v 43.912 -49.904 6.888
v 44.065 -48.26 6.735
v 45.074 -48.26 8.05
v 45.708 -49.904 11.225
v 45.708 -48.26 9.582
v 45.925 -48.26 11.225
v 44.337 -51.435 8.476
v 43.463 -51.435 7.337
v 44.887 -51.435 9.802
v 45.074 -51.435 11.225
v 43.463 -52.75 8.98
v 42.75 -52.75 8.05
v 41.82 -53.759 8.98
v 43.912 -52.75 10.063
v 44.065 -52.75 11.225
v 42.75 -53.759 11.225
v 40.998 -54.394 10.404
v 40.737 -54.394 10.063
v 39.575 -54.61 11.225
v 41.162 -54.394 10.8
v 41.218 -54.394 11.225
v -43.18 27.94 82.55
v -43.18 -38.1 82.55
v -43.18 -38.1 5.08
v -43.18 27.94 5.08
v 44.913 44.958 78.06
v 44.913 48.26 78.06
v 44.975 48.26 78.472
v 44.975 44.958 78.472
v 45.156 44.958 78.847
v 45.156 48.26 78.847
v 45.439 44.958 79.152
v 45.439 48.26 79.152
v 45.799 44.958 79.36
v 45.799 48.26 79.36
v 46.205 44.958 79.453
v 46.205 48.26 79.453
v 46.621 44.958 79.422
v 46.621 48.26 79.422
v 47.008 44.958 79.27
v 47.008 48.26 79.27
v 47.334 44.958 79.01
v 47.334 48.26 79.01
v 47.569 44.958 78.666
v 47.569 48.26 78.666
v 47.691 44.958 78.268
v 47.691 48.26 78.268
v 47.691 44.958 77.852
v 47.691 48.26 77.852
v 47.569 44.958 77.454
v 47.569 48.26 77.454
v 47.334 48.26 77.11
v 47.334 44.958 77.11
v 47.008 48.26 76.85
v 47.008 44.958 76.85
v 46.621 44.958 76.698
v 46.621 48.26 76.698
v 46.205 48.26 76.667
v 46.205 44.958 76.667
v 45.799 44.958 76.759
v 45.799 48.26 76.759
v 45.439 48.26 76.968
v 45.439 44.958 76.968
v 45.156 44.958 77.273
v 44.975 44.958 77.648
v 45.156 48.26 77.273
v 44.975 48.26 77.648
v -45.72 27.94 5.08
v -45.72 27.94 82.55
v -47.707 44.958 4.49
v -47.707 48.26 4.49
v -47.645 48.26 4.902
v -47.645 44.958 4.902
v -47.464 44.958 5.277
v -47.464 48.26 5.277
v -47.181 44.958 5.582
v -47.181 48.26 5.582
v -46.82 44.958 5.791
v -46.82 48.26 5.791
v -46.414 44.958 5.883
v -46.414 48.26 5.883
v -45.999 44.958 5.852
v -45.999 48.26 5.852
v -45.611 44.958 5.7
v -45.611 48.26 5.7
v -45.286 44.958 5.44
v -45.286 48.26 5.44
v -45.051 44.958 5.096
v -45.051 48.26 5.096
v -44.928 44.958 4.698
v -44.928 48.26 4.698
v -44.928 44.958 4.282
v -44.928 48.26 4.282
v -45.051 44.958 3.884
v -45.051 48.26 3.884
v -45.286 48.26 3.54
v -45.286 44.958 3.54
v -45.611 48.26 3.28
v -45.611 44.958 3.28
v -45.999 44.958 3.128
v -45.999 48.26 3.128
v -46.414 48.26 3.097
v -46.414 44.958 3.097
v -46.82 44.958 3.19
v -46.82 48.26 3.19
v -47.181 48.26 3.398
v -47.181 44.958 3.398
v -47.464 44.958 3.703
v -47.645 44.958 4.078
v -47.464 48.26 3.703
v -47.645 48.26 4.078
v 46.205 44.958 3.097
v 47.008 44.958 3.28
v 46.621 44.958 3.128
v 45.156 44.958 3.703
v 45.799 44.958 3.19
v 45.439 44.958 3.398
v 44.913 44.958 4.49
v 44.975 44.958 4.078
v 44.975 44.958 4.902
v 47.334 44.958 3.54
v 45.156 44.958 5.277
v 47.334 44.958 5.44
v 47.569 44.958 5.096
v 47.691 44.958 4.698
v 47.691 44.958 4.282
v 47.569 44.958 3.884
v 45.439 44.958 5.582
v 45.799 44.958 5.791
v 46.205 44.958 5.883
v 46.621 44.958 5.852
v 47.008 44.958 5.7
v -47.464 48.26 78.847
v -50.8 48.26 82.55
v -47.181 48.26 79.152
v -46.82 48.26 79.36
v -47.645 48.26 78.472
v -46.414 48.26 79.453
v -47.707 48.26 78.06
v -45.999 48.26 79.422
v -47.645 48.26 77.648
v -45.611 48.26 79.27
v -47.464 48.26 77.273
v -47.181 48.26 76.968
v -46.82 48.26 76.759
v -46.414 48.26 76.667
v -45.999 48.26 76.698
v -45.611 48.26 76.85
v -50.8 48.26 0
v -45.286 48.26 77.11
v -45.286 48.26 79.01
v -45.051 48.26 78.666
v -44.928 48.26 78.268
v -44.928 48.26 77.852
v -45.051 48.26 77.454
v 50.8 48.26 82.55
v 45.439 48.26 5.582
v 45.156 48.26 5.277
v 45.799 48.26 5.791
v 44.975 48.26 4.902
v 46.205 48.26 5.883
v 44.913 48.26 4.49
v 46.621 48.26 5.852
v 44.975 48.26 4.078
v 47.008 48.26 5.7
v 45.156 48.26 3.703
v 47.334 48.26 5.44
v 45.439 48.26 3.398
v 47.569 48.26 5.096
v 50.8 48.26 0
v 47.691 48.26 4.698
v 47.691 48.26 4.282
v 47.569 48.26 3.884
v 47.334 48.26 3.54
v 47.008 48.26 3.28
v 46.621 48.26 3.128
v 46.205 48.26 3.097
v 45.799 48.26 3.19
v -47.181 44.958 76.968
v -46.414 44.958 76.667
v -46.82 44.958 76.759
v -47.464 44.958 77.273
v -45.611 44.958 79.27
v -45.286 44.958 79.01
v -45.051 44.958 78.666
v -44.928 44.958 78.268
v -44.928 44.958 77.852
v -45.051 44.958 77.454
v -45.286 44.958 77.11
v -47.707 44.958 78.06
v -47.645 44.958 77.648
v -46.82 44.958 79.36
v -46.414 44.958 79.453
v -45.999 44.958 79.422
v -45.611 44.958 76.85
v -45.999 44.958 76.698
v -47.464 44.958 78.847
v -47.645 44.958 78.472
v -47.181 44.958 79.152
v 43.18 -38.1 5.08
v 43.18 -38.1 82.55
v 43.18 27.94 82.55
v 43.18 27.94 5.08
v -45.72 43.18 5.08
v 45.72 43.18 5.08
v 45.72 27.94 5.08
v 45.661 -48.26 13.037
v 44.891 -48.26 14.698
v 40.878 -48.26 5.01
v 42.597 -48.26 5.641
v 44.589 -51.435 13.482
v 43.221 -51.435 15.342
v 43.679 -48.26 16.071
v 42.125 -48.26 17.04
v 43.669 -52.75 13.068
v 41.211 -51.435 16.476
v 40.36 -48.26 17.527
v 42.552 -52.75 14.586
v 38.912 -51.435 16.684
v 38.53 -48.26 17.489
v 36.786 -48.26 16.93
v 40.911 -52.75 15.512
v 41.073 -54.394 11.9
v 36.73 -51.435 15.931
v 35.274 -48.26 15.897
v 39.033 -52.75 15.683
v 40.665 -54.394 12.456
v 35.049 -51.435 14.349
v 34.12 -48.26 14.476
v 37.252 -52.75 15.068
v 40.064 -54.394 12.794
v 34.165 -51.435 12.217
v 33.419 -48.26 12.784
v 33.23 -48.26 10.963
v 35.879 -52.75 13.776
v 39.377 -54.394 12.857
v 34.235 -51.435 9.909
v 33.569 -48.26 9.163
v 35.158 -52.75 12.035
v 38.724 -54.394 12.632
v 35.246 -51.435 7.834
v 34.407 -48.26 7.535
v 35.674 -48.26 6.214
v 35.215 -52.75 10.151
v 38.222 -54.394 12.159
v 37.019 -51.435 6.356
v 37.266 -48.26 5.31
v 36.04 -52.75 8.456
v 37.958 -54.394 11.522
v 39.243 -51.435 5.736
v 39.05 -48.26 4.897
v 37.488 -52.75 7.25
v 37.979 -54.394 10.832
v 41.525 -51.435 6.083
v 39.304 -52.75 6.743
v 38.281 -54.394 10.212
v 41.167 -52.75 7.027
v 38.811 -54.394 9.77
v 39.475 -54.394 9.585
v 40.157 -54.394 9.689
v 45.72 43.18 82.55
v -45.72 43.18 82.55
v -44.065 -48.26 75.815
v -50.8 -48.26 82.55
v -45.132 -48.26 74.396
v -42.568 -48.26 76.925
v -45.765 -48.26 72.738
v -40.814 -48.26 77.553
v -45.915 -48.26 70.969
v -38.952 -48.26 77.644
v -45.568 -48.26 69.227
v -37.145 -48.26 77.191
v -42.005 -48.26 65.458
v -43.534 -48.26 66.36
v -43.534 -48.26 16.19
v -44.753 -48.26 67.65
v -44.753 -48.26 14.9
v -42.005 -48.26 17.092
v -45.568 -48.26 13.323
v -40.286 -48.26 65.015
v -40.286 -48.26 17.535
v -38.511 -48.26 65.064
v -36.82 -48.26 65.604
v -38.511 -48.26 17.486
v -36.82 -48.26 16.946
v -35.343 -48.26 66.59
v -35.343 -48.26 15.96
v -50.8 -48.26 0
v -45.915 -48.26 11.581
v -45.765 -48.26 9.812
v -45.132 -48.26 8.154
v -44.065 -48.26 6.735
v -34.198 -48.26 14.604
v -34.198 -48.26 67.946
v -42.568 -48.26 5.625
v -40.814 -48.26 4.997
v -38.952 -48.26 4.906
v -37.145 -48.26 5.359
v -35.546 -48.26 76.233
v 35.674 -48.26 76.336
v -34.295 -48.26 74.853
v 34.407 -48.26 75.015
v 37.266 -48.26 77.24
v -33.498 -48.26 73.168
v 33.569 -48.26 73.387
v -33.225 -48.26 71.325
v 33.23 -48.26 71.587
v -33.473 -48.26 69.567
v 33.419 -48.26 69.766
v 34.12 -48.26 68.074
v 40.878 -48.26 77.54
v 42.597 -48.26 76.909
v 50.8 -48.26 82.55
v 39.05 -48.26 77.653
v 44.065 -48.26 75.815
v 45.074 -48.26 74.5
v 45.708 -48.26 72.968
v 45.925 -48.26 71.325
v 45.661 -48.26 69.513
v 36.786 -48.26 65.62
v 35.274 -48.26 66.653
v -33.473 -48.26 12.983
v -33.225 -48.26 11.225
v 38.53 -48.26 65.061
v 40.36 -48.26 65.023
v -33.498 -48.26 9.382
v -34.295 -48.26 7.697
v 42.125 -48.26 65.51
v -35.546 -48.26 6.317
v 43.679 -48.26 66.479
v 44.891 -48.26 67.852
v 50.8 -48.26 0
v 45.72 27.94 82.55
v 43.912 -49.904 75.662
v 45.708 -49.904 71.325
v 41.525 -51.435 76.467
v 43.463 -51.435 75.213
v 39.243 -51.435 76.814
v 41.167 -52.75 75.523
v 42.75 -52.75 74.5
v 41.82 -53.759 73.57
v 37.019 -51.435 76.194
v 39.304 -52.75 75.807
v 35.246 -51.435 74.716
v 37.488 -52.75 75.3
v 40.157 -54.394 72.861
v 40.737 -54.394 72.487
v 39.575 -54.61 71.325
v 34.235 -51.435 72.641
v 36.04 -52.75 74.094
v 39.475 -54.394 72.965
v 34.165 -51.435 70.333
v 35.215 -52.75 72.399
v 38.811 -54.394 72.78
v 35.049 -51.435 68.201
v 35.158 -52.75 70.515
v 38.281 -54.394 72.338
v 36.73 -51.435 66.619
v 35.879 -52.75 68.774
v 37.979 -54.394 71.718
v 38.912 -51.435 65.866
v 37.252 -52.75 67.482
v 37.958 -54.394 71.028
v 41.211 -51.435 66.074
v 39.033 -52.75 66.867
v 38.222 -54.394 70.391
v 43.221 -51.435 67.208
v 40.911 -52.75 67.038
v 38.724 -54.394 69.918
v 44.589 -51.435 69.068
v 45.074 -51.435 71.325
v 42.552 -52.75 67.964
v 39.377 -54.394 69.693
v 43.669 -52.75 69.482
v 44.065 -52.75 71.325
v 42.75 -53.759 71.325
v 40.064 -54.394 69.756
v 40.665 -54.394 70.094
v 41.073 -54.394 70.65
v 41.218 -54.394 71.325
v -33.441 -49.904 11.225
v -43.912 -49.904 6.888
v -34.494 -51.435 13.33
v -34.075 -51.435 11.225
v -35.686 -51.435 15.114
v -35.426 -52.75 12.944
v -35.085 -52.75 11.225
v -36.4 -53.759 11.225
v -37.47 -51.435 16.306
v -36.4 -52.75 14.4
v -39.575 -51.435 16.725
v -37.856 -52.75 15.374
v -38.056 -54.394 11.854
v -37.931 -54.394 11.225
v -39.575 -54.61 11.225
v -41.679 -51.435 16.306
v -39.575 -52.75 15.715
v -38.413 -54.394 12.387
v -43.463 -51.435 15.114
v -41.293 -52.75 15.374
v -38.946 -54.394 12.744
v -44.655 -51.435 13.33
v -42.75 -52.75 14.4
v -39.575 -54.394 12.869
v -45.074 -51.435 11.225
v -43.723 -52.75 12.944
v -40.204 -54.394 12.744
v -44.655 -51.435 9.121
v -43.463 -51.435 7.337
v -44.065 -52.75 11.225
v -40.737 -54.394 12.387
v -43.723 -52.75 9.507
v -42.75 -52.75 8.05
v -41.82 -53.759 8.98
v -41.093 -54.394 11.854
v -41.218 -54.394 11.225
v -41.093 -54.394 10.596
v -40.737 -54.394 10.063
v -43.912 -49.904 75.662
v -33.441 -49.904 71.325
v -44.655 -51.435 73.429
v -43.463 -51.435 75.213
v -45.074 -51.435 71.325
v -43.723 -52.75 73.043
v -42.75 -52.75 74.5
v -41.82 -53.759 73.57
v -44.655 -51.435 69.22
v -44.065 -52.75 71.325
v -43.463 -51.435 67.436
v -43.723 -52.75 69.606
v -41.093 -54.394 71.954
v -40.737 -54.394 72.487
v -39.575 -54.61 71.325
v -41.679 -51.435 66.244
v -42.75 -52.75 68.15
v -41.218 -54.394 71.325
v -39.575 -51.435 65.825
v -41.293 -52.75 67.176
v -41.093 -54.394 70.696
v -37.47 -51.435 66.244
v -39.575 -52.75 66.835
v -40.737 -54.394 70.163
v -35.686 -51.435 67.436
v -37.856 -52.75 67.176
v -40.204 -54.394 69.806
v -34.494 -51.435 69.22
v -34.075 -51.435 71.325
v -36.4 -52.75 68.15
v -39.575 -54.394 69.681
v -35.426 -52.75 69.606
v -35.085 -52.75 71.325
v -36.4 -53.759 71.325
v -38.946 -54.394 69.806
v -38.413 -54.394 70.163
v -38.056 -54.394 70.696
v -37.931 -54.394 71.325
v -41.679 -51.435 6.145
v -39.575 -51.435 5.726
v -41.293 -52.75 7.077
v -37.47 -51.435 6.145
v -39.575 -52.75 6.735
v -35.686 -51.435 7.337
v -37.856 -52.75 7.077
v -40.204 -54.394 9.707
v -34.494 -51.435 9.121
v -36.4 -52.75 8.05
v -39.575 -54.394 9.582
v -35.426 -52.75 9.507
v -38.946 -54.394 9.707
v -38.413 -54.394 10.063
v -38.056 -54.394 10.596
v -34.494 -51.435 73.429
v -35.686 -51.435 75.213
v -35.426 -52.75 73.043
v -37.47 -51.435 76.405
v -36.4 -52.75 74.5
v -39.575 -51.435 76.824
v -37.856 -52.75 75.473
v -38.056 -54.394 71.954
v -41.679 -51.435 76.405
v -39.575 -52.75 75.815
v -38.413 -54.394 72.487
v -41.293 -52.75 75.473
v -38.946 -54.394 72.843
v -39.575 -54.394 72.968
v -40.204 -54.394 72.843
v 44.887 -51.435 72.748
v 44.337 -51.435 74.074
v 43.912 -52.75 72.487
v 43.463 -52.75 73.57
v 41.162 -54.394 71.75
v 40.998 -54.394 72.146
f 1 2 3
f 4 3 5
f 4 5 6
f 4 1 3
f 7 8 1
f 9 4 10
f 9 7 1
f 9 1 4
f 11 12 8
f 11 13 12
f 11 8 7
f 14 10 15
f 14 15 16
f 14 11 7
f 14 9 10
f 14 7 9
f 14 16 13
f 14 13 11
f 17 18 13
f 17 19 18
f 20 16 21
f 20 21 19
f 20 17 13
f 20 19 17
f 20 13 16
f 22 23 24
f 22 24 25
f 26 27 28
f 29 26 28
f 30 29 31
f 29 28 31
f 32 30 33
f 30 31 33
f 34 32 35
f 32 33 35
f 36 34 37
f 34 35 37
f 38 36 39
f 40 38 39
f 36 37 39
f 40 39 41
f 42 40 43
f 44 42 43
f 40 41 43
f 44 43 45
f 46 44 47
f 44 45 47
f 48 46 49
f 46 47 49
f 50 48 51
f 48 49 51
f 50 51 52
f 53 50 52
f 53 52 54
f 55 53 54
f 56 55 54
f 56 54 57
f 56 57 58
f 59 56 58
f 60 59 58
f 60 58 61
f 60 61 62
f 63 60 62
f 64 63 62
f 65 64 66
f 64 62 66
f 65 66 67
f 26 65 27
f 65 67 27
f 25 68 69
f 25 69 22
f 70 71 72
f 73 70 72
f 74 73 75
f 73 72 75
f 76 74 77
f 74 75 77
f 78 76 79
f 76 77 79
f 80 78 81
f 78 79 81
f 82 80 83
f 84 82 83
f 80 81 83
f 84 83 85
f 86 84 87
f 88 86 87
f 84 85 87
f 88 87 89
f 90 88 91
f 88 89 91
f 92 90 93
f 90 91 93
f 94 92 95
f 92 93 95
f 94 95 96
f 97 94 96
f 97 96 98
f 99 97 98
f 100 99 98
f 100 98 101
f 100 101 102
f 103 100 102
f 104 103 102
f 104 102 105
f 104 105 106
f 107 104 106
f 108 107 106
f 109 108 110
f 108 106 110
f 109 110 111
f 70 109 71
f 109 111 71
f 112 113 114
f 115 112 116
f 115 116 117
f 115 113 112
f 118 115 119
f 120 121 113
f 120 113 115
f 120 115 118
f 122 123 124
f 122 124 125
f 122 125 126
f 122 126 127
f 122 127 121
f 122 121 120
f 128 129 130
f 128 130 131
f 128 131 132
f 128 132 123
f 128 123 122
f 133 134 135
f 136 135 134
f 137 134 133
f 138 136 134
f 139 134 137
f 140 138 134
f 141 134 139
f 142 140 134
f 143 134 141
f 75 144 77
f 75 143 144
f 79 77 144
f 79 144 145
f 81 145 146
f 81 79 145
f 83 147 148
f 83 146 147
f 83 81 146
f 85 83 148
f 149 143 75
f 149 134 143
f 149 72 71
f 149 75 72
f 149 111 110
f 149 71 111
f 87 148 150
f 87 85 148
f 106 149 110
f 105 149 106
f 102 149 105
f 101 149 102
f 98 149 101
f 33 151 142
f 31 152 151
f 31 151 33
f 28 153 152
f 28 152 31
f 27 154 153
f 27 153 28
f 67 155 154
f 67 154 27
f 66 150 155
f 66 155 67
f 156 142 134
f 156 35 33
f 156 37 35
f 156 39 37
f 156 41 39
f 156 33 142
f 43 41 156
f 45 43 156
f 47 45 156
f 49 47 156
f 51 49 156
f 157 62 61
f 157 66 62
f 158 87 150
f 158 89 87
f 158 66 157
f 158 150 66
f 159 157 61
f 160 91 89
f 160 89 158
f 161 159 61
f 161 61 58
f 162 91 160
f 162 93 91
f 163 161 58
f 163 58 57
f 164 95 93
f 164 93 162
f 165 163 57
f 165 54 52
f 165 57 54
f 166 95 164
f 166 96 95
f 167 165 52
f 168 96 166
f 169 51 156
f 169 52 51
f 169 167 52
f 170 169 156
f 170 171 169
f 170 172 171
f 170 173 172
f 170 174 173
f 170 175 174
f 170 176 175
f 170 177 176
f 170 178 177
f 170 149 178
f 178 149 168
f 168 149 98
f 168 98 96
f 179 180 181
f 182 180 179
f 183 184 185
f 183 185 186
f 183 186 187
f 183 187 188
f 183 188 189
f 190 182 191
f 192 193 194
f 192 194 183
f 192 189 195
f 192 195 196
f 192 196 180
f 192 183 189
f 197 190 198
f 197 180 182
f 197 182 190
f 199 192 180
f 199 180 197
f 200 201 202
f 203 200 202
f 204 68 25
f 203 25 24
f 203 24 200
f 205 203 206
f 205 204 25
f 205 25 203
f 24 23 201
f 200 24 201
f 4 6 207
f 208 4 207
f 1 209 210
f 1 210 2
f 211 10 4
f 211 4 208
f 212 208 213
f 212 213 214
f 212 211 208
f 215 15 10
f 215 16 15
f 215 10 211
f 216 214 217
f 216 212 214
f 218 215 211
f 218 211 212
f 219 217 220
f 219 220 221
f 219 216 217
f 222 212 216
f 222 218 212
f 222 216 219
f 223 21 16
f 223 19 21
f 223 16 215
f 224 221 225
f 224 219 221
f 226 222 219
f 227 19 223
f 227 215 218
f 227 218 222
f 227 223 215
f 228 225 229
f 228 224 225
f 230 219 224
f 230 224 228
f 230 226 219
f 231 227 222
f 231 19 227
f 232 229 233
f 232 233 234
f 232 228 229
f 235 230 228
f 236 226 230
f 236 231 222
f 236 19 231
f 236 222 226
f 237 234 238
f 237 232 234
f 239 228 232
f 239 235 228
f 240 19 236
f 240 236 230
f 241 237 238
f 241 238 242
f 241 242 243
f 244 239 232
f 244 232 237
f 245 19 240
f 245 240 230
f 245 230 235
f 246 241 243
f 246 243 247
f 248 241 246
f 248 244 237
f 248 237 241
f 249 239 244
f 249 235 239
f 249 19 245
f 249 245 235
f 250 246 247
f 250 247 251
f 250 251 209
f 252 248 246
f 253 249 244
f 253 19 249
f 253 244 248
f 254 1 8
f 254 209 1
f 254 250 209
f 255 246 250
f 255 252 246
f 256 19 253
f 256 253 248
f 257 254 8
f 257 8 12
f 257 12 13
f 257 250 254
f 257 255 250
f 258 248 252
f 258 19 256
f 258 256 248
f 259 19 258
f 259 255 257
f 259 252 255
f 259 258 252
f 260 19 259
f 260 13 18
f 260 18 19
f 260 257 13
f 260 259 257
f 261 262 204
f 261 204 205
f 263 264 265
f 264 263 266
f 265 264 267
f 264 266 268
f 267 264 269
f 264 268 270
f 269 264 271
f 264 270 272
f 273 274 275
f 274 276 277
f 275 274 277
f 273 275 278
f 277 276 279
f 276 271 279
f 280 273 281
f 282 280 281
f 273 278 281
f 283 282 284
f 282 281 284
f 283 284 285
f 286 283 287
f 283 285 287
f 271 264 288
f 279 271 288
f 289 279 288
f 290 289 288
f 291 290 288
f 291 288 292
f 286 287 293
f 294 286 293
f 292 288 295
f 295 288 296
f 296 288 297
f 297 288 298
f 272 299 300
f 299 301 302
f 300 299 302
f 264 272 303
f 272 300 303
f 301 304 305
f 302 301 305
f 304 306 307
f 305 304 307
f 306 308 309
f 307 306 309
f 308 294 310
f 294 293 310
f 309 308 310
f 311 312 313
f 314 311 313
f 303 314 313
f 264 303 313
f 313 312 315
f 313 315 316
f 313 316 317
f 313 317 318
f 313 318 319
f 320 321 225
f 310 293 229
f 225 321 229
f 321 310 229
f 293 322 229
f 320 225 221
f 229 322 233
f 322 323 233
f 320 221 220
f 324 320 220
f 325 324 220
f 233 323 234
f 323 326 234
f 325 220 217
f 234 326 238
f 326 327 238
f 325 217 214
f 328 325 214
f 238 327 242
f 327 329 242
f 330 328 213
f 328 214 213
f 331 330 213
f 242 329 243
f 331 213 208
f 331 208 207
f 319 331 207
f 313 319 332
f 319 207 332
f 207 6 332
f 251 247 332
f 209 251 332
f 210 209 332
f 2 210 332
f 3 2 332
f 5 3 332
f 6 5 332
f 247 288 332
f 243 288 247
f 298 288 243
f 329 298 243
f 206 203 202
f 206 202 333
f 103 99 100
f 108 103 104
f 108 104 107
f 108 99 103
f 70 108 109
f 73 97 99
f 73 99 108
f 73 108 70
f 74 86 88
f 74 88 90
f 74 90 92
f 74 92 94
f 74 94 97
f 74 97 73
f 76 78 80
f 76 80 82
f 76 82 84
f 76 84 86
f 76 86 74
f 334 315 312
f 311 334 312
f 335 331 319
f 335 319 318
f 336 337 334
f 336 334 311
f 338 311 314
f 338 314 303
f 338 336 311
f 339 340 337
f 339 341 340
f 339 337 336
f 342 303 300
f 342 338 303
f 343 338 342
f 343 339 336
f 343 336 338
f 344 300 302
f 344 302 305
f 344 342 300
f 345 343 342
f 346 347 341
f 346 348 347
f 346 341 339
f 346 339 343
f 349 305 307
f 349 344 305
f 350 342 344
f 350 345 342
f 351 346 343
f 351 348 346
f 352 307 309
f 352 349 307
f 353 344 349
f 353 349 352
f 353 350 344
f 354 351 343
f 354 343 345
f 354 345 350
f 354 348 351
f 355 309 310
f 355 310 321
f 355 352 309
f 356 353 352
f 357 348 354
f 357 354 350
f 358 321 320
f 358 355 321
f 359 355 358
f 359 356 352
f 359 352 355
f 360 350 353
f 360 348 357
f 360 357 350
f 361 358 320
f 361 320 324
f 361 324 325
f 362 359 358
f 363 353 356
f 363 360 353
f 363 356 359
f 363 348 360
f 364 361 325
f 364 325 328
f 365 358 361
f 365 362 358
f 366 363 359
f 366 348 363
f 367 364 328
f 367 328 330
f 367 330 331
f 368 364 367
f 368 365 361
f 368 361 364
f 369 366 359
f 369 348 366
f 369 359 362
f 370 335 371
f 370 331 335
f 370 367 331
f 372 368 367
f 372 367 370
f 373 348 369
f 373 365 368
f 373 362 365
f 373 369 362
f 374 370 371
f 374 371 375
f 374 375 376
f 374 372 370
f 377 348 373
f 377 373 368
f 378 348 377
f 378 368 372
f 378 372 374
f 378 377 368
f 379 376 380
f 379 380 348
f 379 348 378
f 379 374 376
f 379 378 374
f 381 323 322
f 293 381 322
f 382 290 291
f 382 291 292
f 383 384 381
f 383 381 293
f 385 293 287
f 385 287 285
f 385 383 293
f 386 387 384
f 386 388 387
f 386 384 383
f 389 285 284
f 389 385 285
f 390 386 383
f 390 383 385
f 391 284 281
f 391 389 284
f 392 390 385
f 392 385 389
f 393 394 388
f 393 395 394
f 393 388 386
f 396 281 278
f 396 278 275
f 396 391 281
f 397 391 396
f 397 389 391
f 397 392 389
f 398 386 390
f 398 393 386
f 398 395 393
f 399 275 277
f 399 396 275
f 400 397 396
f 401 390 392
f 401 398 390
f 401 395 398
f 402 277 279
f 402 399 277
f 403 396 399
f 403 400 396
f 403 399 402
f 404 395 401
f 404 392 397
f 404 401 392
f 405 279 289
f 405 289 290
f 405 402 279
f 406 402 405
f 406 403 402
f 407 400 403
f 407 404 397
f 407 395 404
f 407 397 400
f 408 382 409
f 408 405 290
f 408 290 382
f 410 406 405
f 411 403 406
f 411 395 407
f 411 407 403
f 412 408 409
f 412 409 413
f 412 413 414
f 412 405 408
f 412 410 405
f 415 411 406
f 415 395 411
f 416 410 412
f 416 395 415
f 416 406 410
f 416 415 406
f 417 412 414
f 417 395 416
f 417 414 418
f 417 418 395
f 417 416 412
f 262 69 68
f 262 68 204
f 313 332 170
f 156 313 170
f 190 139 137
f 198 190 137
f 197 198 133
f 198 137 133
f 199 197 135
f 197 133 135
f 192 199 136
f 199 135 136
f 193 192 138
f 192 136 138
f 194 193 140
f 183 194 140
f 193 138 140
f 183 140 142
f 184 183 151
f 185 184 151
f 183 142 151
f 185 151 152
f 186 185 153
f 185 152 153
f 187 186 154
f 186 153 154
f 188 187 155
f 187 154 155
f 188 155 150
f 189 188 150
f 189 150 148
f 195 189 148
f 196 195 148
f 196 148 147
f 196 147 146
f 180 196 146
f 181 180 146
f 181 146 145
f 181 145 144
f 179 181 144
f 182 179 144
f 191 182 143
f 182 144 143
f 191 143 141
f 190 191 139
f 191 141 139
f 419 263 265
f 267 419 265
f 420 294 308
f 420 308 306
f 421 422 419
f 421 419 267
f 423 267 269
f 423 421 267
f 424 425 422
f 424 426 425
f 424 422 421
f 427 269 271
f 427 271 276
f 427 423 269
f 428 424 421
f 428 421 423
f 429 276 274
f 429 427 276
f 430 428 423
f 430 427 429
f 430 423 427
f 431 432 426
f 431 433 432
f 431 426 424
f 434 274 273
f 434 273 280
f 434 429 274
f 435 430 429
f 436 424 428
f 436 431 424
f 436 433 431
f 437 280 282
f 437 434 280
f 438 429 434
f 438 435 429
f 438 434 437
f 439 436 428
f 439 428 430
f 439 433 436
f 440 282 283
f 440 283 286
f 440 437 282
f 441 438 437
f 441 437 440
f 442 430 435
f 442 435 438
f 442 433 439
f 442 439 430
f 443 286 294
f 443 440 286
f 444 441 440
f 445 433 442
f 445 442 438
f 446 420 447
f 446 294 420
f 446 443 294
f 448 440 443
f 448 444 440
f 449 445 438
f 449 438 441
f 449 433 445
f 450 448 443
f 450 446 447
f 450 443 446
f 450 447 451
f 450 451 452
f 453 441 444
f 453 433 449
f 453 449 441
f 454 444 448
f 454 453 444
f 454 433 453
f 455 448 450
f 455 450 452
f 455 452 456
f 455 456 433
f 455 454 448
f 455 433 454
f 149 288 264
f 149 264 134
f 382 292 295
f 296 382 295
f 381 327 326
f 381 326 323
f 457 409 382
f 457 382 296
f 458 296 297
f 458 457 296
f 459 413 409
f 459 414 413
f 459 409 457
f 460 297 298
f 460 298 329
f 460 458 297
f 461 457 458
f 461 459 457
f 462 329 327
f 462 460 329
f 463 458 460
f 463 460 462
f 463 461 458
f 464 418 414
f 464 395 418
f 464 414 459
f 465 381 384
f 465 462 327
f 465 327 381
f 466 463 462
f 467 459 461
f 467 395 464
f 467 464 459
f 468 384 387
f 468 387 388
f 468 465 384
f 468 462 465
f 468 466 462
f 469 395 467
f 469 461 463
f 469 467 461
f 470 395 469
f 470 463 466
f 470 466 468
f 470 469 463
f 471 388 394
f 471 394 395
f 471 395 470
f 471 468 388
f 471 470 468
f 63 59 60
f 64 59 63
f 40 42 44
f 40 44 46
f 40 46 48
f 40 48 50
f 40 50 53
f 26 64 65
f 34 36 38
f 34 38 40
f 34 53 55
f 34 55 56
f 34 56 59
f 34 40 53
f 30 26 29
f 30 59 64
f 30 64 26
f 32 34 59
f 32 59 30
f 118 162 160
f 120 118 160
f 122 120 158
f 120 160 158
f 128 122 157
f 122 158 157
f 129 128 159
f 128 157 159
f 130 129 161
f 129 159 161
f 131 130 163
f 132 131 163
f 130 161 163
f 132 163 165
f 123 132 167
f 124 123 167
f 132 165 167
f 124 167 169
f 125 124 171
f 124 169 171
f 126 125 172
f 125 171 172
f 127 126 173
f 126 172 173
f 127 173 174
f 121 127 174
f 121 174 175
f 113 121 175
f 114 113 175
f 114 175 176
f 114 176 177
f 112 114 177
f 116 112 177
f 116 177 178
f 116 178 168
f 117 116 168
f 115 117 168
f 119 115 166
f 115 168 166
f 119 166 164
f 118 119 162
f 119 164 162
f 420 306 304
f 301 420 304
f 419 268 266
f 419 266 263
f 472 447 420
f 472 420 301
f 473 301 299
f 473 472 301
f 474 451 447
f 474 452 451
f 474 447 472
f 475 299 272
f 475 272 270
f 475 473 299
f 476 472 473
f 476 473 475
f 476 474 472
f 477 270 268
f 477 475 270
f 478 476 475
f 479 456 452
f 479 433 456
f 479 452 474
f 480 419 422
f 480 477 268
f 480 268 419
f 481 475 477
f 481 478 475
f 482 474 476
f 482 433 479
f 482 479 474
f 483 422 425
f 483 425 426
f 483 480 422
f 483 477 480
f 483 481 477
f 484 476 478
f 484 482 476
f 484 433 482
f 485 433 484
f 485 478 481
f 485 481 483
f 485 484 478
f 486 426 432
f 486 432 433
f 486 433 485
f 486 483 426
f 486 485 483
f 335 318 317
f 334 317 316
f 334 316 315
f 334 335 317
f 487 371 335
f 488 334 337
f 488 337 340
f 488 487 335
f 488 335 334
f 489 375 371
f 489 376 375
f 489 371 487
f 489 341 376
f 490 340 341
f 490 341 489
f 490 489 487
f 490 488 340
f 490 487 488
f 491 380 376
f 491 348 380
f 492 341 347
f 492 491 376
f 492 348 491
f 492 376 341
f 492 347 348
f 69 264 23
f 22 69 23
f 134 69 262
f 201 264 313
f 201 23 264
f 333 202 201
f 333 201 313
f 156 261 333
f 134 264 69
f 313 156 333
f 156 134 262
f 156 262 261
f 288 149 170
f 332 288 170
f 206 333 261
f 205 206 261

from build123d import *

# Parameters (mm, degrees)
F0_W     = 101.6
F0_H     = 96.52
F1_DEPTH = 82.55
F2_W     = 91.44
F2_H     = 81.28
F3_DEPTH = 77.47
F4_W     = 2.54
F4_H     = 66.04
F5_DEPTH = 81.28
F6_R     = 1.397
F7_DEPTH = 3.302
F9_DEPTH = 6.35
F10_R    = 6.34999


# Not quite as in the source:
# - a fillet or chamfer is up to 0.001 mm smaller than in the source, because OpenCascade refuses the exact size


with BuildPart() as f1:
    # F0 (on Top) → F1 (new body)
    with BuildSketch(Plane.XY):
        Rectangle(F0_W, F0_H)
    extrude(amount=F1_DEPTH)

    # F2 (on face) → F3 (cut)
    with BuildSketch(Plane.XY.offset(82.55)):
        with Locations((0, 2.54)):
            Rectangle(F2_W, F2_H)
    extrude(amount=-F3_DEPTH, mode=Mode.SUBTRACT)

    # F4 (on face) → F5 (join)
    with BuildSketch(Plane.XY.offset(82.55)):
        with Locations((-44.45, -5.08)):
            Rectangle(F4_W, F4_H)
        with Locations((44.45, -5.08)):
            Rectangle(F4_W, F4_H)
    extrude(amount=-F5_DEPTH)

    # F6 (on face) → F7 (cut)
    with BuildSketch(Plane(origin=(0, 48.26, 0), x_dir=(-1, 0, 0), z_dir=(0, 1, 0))):
        with Locations((-46.3098719395, 78.0598719395)):
            Circle(F6_R)
        with Locations((46.3098719395, 78.0598719395)):
            Circle(F6_R)
        with Locations((46.3098719395, 4.4901280605)):
            Circle(F6_R)
        with Locations((-46.3098719395, 4.4901280605)):
            Circle(F6_R)
    extrude(amount=-F7_DEPTH, mode=Mode.SUBTRACT)

    # F8 (on face) → F9 (join)
    with BuildSketch(Plane.XZ.offset(48.26)):
        with BuildLine():
            ThreePointArc((-44.0648079092, 75.8148079092), (-42.0047196442, 65.4580448172), (-33.2246798487, 71.3246798487))
            ThreePointArc((-33.2246798487, 71.3246798487), (-37.1446400531, 77.1913148801), (-44.0648079092, 75.8148079092))
        make_face()
        with BuildLine():
            ThreePointArc((44.0648079092, 75.8148079092), (33.7080448172, 68.8946400531), (45.9246798487, 71.3246798487))
            ThreePointArc((45.9246798487, 71.3246798487), (45.4413148801, 73.7547196442), (44.0648079092, 75.8148079092))
        make_face()
        with BuildLine():
            ThreePointArc((44.0648079092, 6.7351920908), (45.4413148801, 8.7952803558), (45.9246798487, 11.2253201513))
            ThreePointArc((45.9246798487, 11.2253201513), (33.7080448172, 13.6553599469), (44.0648079092, 6.7351920908))
        make_face()
        with BuildLine():
            ThreePointArc((-44.0648079092, 6.7351920908), (-37.1446400531, 5.3586851199), (-33.2246798487, 11.2253201513))
            ThreePointArc((-33.2246798487, 11.2253201513), (-42.0047196442, 17.0919551828), (-44.0648079092, 6.7351920908))
        make_face()
    extrude(amount=F9_DEPTH)

    # F10 (radius 6.35 in the source; OpenCascade refuses exactly that, so slightly less here)
    f10_edges = [f1.edges().sort_by_distance(p)[0] for p in [
        (-45.92468, -54.61, 71.32468),
        (33.22468, -54.61, 71.32468),
        (35.084552, -54.61, 15.715448),
        (-35.084552, -54.61, 15.715448),
    ]]
    fillet(f10_edges, radius=F10_R)


solid = f1.part
